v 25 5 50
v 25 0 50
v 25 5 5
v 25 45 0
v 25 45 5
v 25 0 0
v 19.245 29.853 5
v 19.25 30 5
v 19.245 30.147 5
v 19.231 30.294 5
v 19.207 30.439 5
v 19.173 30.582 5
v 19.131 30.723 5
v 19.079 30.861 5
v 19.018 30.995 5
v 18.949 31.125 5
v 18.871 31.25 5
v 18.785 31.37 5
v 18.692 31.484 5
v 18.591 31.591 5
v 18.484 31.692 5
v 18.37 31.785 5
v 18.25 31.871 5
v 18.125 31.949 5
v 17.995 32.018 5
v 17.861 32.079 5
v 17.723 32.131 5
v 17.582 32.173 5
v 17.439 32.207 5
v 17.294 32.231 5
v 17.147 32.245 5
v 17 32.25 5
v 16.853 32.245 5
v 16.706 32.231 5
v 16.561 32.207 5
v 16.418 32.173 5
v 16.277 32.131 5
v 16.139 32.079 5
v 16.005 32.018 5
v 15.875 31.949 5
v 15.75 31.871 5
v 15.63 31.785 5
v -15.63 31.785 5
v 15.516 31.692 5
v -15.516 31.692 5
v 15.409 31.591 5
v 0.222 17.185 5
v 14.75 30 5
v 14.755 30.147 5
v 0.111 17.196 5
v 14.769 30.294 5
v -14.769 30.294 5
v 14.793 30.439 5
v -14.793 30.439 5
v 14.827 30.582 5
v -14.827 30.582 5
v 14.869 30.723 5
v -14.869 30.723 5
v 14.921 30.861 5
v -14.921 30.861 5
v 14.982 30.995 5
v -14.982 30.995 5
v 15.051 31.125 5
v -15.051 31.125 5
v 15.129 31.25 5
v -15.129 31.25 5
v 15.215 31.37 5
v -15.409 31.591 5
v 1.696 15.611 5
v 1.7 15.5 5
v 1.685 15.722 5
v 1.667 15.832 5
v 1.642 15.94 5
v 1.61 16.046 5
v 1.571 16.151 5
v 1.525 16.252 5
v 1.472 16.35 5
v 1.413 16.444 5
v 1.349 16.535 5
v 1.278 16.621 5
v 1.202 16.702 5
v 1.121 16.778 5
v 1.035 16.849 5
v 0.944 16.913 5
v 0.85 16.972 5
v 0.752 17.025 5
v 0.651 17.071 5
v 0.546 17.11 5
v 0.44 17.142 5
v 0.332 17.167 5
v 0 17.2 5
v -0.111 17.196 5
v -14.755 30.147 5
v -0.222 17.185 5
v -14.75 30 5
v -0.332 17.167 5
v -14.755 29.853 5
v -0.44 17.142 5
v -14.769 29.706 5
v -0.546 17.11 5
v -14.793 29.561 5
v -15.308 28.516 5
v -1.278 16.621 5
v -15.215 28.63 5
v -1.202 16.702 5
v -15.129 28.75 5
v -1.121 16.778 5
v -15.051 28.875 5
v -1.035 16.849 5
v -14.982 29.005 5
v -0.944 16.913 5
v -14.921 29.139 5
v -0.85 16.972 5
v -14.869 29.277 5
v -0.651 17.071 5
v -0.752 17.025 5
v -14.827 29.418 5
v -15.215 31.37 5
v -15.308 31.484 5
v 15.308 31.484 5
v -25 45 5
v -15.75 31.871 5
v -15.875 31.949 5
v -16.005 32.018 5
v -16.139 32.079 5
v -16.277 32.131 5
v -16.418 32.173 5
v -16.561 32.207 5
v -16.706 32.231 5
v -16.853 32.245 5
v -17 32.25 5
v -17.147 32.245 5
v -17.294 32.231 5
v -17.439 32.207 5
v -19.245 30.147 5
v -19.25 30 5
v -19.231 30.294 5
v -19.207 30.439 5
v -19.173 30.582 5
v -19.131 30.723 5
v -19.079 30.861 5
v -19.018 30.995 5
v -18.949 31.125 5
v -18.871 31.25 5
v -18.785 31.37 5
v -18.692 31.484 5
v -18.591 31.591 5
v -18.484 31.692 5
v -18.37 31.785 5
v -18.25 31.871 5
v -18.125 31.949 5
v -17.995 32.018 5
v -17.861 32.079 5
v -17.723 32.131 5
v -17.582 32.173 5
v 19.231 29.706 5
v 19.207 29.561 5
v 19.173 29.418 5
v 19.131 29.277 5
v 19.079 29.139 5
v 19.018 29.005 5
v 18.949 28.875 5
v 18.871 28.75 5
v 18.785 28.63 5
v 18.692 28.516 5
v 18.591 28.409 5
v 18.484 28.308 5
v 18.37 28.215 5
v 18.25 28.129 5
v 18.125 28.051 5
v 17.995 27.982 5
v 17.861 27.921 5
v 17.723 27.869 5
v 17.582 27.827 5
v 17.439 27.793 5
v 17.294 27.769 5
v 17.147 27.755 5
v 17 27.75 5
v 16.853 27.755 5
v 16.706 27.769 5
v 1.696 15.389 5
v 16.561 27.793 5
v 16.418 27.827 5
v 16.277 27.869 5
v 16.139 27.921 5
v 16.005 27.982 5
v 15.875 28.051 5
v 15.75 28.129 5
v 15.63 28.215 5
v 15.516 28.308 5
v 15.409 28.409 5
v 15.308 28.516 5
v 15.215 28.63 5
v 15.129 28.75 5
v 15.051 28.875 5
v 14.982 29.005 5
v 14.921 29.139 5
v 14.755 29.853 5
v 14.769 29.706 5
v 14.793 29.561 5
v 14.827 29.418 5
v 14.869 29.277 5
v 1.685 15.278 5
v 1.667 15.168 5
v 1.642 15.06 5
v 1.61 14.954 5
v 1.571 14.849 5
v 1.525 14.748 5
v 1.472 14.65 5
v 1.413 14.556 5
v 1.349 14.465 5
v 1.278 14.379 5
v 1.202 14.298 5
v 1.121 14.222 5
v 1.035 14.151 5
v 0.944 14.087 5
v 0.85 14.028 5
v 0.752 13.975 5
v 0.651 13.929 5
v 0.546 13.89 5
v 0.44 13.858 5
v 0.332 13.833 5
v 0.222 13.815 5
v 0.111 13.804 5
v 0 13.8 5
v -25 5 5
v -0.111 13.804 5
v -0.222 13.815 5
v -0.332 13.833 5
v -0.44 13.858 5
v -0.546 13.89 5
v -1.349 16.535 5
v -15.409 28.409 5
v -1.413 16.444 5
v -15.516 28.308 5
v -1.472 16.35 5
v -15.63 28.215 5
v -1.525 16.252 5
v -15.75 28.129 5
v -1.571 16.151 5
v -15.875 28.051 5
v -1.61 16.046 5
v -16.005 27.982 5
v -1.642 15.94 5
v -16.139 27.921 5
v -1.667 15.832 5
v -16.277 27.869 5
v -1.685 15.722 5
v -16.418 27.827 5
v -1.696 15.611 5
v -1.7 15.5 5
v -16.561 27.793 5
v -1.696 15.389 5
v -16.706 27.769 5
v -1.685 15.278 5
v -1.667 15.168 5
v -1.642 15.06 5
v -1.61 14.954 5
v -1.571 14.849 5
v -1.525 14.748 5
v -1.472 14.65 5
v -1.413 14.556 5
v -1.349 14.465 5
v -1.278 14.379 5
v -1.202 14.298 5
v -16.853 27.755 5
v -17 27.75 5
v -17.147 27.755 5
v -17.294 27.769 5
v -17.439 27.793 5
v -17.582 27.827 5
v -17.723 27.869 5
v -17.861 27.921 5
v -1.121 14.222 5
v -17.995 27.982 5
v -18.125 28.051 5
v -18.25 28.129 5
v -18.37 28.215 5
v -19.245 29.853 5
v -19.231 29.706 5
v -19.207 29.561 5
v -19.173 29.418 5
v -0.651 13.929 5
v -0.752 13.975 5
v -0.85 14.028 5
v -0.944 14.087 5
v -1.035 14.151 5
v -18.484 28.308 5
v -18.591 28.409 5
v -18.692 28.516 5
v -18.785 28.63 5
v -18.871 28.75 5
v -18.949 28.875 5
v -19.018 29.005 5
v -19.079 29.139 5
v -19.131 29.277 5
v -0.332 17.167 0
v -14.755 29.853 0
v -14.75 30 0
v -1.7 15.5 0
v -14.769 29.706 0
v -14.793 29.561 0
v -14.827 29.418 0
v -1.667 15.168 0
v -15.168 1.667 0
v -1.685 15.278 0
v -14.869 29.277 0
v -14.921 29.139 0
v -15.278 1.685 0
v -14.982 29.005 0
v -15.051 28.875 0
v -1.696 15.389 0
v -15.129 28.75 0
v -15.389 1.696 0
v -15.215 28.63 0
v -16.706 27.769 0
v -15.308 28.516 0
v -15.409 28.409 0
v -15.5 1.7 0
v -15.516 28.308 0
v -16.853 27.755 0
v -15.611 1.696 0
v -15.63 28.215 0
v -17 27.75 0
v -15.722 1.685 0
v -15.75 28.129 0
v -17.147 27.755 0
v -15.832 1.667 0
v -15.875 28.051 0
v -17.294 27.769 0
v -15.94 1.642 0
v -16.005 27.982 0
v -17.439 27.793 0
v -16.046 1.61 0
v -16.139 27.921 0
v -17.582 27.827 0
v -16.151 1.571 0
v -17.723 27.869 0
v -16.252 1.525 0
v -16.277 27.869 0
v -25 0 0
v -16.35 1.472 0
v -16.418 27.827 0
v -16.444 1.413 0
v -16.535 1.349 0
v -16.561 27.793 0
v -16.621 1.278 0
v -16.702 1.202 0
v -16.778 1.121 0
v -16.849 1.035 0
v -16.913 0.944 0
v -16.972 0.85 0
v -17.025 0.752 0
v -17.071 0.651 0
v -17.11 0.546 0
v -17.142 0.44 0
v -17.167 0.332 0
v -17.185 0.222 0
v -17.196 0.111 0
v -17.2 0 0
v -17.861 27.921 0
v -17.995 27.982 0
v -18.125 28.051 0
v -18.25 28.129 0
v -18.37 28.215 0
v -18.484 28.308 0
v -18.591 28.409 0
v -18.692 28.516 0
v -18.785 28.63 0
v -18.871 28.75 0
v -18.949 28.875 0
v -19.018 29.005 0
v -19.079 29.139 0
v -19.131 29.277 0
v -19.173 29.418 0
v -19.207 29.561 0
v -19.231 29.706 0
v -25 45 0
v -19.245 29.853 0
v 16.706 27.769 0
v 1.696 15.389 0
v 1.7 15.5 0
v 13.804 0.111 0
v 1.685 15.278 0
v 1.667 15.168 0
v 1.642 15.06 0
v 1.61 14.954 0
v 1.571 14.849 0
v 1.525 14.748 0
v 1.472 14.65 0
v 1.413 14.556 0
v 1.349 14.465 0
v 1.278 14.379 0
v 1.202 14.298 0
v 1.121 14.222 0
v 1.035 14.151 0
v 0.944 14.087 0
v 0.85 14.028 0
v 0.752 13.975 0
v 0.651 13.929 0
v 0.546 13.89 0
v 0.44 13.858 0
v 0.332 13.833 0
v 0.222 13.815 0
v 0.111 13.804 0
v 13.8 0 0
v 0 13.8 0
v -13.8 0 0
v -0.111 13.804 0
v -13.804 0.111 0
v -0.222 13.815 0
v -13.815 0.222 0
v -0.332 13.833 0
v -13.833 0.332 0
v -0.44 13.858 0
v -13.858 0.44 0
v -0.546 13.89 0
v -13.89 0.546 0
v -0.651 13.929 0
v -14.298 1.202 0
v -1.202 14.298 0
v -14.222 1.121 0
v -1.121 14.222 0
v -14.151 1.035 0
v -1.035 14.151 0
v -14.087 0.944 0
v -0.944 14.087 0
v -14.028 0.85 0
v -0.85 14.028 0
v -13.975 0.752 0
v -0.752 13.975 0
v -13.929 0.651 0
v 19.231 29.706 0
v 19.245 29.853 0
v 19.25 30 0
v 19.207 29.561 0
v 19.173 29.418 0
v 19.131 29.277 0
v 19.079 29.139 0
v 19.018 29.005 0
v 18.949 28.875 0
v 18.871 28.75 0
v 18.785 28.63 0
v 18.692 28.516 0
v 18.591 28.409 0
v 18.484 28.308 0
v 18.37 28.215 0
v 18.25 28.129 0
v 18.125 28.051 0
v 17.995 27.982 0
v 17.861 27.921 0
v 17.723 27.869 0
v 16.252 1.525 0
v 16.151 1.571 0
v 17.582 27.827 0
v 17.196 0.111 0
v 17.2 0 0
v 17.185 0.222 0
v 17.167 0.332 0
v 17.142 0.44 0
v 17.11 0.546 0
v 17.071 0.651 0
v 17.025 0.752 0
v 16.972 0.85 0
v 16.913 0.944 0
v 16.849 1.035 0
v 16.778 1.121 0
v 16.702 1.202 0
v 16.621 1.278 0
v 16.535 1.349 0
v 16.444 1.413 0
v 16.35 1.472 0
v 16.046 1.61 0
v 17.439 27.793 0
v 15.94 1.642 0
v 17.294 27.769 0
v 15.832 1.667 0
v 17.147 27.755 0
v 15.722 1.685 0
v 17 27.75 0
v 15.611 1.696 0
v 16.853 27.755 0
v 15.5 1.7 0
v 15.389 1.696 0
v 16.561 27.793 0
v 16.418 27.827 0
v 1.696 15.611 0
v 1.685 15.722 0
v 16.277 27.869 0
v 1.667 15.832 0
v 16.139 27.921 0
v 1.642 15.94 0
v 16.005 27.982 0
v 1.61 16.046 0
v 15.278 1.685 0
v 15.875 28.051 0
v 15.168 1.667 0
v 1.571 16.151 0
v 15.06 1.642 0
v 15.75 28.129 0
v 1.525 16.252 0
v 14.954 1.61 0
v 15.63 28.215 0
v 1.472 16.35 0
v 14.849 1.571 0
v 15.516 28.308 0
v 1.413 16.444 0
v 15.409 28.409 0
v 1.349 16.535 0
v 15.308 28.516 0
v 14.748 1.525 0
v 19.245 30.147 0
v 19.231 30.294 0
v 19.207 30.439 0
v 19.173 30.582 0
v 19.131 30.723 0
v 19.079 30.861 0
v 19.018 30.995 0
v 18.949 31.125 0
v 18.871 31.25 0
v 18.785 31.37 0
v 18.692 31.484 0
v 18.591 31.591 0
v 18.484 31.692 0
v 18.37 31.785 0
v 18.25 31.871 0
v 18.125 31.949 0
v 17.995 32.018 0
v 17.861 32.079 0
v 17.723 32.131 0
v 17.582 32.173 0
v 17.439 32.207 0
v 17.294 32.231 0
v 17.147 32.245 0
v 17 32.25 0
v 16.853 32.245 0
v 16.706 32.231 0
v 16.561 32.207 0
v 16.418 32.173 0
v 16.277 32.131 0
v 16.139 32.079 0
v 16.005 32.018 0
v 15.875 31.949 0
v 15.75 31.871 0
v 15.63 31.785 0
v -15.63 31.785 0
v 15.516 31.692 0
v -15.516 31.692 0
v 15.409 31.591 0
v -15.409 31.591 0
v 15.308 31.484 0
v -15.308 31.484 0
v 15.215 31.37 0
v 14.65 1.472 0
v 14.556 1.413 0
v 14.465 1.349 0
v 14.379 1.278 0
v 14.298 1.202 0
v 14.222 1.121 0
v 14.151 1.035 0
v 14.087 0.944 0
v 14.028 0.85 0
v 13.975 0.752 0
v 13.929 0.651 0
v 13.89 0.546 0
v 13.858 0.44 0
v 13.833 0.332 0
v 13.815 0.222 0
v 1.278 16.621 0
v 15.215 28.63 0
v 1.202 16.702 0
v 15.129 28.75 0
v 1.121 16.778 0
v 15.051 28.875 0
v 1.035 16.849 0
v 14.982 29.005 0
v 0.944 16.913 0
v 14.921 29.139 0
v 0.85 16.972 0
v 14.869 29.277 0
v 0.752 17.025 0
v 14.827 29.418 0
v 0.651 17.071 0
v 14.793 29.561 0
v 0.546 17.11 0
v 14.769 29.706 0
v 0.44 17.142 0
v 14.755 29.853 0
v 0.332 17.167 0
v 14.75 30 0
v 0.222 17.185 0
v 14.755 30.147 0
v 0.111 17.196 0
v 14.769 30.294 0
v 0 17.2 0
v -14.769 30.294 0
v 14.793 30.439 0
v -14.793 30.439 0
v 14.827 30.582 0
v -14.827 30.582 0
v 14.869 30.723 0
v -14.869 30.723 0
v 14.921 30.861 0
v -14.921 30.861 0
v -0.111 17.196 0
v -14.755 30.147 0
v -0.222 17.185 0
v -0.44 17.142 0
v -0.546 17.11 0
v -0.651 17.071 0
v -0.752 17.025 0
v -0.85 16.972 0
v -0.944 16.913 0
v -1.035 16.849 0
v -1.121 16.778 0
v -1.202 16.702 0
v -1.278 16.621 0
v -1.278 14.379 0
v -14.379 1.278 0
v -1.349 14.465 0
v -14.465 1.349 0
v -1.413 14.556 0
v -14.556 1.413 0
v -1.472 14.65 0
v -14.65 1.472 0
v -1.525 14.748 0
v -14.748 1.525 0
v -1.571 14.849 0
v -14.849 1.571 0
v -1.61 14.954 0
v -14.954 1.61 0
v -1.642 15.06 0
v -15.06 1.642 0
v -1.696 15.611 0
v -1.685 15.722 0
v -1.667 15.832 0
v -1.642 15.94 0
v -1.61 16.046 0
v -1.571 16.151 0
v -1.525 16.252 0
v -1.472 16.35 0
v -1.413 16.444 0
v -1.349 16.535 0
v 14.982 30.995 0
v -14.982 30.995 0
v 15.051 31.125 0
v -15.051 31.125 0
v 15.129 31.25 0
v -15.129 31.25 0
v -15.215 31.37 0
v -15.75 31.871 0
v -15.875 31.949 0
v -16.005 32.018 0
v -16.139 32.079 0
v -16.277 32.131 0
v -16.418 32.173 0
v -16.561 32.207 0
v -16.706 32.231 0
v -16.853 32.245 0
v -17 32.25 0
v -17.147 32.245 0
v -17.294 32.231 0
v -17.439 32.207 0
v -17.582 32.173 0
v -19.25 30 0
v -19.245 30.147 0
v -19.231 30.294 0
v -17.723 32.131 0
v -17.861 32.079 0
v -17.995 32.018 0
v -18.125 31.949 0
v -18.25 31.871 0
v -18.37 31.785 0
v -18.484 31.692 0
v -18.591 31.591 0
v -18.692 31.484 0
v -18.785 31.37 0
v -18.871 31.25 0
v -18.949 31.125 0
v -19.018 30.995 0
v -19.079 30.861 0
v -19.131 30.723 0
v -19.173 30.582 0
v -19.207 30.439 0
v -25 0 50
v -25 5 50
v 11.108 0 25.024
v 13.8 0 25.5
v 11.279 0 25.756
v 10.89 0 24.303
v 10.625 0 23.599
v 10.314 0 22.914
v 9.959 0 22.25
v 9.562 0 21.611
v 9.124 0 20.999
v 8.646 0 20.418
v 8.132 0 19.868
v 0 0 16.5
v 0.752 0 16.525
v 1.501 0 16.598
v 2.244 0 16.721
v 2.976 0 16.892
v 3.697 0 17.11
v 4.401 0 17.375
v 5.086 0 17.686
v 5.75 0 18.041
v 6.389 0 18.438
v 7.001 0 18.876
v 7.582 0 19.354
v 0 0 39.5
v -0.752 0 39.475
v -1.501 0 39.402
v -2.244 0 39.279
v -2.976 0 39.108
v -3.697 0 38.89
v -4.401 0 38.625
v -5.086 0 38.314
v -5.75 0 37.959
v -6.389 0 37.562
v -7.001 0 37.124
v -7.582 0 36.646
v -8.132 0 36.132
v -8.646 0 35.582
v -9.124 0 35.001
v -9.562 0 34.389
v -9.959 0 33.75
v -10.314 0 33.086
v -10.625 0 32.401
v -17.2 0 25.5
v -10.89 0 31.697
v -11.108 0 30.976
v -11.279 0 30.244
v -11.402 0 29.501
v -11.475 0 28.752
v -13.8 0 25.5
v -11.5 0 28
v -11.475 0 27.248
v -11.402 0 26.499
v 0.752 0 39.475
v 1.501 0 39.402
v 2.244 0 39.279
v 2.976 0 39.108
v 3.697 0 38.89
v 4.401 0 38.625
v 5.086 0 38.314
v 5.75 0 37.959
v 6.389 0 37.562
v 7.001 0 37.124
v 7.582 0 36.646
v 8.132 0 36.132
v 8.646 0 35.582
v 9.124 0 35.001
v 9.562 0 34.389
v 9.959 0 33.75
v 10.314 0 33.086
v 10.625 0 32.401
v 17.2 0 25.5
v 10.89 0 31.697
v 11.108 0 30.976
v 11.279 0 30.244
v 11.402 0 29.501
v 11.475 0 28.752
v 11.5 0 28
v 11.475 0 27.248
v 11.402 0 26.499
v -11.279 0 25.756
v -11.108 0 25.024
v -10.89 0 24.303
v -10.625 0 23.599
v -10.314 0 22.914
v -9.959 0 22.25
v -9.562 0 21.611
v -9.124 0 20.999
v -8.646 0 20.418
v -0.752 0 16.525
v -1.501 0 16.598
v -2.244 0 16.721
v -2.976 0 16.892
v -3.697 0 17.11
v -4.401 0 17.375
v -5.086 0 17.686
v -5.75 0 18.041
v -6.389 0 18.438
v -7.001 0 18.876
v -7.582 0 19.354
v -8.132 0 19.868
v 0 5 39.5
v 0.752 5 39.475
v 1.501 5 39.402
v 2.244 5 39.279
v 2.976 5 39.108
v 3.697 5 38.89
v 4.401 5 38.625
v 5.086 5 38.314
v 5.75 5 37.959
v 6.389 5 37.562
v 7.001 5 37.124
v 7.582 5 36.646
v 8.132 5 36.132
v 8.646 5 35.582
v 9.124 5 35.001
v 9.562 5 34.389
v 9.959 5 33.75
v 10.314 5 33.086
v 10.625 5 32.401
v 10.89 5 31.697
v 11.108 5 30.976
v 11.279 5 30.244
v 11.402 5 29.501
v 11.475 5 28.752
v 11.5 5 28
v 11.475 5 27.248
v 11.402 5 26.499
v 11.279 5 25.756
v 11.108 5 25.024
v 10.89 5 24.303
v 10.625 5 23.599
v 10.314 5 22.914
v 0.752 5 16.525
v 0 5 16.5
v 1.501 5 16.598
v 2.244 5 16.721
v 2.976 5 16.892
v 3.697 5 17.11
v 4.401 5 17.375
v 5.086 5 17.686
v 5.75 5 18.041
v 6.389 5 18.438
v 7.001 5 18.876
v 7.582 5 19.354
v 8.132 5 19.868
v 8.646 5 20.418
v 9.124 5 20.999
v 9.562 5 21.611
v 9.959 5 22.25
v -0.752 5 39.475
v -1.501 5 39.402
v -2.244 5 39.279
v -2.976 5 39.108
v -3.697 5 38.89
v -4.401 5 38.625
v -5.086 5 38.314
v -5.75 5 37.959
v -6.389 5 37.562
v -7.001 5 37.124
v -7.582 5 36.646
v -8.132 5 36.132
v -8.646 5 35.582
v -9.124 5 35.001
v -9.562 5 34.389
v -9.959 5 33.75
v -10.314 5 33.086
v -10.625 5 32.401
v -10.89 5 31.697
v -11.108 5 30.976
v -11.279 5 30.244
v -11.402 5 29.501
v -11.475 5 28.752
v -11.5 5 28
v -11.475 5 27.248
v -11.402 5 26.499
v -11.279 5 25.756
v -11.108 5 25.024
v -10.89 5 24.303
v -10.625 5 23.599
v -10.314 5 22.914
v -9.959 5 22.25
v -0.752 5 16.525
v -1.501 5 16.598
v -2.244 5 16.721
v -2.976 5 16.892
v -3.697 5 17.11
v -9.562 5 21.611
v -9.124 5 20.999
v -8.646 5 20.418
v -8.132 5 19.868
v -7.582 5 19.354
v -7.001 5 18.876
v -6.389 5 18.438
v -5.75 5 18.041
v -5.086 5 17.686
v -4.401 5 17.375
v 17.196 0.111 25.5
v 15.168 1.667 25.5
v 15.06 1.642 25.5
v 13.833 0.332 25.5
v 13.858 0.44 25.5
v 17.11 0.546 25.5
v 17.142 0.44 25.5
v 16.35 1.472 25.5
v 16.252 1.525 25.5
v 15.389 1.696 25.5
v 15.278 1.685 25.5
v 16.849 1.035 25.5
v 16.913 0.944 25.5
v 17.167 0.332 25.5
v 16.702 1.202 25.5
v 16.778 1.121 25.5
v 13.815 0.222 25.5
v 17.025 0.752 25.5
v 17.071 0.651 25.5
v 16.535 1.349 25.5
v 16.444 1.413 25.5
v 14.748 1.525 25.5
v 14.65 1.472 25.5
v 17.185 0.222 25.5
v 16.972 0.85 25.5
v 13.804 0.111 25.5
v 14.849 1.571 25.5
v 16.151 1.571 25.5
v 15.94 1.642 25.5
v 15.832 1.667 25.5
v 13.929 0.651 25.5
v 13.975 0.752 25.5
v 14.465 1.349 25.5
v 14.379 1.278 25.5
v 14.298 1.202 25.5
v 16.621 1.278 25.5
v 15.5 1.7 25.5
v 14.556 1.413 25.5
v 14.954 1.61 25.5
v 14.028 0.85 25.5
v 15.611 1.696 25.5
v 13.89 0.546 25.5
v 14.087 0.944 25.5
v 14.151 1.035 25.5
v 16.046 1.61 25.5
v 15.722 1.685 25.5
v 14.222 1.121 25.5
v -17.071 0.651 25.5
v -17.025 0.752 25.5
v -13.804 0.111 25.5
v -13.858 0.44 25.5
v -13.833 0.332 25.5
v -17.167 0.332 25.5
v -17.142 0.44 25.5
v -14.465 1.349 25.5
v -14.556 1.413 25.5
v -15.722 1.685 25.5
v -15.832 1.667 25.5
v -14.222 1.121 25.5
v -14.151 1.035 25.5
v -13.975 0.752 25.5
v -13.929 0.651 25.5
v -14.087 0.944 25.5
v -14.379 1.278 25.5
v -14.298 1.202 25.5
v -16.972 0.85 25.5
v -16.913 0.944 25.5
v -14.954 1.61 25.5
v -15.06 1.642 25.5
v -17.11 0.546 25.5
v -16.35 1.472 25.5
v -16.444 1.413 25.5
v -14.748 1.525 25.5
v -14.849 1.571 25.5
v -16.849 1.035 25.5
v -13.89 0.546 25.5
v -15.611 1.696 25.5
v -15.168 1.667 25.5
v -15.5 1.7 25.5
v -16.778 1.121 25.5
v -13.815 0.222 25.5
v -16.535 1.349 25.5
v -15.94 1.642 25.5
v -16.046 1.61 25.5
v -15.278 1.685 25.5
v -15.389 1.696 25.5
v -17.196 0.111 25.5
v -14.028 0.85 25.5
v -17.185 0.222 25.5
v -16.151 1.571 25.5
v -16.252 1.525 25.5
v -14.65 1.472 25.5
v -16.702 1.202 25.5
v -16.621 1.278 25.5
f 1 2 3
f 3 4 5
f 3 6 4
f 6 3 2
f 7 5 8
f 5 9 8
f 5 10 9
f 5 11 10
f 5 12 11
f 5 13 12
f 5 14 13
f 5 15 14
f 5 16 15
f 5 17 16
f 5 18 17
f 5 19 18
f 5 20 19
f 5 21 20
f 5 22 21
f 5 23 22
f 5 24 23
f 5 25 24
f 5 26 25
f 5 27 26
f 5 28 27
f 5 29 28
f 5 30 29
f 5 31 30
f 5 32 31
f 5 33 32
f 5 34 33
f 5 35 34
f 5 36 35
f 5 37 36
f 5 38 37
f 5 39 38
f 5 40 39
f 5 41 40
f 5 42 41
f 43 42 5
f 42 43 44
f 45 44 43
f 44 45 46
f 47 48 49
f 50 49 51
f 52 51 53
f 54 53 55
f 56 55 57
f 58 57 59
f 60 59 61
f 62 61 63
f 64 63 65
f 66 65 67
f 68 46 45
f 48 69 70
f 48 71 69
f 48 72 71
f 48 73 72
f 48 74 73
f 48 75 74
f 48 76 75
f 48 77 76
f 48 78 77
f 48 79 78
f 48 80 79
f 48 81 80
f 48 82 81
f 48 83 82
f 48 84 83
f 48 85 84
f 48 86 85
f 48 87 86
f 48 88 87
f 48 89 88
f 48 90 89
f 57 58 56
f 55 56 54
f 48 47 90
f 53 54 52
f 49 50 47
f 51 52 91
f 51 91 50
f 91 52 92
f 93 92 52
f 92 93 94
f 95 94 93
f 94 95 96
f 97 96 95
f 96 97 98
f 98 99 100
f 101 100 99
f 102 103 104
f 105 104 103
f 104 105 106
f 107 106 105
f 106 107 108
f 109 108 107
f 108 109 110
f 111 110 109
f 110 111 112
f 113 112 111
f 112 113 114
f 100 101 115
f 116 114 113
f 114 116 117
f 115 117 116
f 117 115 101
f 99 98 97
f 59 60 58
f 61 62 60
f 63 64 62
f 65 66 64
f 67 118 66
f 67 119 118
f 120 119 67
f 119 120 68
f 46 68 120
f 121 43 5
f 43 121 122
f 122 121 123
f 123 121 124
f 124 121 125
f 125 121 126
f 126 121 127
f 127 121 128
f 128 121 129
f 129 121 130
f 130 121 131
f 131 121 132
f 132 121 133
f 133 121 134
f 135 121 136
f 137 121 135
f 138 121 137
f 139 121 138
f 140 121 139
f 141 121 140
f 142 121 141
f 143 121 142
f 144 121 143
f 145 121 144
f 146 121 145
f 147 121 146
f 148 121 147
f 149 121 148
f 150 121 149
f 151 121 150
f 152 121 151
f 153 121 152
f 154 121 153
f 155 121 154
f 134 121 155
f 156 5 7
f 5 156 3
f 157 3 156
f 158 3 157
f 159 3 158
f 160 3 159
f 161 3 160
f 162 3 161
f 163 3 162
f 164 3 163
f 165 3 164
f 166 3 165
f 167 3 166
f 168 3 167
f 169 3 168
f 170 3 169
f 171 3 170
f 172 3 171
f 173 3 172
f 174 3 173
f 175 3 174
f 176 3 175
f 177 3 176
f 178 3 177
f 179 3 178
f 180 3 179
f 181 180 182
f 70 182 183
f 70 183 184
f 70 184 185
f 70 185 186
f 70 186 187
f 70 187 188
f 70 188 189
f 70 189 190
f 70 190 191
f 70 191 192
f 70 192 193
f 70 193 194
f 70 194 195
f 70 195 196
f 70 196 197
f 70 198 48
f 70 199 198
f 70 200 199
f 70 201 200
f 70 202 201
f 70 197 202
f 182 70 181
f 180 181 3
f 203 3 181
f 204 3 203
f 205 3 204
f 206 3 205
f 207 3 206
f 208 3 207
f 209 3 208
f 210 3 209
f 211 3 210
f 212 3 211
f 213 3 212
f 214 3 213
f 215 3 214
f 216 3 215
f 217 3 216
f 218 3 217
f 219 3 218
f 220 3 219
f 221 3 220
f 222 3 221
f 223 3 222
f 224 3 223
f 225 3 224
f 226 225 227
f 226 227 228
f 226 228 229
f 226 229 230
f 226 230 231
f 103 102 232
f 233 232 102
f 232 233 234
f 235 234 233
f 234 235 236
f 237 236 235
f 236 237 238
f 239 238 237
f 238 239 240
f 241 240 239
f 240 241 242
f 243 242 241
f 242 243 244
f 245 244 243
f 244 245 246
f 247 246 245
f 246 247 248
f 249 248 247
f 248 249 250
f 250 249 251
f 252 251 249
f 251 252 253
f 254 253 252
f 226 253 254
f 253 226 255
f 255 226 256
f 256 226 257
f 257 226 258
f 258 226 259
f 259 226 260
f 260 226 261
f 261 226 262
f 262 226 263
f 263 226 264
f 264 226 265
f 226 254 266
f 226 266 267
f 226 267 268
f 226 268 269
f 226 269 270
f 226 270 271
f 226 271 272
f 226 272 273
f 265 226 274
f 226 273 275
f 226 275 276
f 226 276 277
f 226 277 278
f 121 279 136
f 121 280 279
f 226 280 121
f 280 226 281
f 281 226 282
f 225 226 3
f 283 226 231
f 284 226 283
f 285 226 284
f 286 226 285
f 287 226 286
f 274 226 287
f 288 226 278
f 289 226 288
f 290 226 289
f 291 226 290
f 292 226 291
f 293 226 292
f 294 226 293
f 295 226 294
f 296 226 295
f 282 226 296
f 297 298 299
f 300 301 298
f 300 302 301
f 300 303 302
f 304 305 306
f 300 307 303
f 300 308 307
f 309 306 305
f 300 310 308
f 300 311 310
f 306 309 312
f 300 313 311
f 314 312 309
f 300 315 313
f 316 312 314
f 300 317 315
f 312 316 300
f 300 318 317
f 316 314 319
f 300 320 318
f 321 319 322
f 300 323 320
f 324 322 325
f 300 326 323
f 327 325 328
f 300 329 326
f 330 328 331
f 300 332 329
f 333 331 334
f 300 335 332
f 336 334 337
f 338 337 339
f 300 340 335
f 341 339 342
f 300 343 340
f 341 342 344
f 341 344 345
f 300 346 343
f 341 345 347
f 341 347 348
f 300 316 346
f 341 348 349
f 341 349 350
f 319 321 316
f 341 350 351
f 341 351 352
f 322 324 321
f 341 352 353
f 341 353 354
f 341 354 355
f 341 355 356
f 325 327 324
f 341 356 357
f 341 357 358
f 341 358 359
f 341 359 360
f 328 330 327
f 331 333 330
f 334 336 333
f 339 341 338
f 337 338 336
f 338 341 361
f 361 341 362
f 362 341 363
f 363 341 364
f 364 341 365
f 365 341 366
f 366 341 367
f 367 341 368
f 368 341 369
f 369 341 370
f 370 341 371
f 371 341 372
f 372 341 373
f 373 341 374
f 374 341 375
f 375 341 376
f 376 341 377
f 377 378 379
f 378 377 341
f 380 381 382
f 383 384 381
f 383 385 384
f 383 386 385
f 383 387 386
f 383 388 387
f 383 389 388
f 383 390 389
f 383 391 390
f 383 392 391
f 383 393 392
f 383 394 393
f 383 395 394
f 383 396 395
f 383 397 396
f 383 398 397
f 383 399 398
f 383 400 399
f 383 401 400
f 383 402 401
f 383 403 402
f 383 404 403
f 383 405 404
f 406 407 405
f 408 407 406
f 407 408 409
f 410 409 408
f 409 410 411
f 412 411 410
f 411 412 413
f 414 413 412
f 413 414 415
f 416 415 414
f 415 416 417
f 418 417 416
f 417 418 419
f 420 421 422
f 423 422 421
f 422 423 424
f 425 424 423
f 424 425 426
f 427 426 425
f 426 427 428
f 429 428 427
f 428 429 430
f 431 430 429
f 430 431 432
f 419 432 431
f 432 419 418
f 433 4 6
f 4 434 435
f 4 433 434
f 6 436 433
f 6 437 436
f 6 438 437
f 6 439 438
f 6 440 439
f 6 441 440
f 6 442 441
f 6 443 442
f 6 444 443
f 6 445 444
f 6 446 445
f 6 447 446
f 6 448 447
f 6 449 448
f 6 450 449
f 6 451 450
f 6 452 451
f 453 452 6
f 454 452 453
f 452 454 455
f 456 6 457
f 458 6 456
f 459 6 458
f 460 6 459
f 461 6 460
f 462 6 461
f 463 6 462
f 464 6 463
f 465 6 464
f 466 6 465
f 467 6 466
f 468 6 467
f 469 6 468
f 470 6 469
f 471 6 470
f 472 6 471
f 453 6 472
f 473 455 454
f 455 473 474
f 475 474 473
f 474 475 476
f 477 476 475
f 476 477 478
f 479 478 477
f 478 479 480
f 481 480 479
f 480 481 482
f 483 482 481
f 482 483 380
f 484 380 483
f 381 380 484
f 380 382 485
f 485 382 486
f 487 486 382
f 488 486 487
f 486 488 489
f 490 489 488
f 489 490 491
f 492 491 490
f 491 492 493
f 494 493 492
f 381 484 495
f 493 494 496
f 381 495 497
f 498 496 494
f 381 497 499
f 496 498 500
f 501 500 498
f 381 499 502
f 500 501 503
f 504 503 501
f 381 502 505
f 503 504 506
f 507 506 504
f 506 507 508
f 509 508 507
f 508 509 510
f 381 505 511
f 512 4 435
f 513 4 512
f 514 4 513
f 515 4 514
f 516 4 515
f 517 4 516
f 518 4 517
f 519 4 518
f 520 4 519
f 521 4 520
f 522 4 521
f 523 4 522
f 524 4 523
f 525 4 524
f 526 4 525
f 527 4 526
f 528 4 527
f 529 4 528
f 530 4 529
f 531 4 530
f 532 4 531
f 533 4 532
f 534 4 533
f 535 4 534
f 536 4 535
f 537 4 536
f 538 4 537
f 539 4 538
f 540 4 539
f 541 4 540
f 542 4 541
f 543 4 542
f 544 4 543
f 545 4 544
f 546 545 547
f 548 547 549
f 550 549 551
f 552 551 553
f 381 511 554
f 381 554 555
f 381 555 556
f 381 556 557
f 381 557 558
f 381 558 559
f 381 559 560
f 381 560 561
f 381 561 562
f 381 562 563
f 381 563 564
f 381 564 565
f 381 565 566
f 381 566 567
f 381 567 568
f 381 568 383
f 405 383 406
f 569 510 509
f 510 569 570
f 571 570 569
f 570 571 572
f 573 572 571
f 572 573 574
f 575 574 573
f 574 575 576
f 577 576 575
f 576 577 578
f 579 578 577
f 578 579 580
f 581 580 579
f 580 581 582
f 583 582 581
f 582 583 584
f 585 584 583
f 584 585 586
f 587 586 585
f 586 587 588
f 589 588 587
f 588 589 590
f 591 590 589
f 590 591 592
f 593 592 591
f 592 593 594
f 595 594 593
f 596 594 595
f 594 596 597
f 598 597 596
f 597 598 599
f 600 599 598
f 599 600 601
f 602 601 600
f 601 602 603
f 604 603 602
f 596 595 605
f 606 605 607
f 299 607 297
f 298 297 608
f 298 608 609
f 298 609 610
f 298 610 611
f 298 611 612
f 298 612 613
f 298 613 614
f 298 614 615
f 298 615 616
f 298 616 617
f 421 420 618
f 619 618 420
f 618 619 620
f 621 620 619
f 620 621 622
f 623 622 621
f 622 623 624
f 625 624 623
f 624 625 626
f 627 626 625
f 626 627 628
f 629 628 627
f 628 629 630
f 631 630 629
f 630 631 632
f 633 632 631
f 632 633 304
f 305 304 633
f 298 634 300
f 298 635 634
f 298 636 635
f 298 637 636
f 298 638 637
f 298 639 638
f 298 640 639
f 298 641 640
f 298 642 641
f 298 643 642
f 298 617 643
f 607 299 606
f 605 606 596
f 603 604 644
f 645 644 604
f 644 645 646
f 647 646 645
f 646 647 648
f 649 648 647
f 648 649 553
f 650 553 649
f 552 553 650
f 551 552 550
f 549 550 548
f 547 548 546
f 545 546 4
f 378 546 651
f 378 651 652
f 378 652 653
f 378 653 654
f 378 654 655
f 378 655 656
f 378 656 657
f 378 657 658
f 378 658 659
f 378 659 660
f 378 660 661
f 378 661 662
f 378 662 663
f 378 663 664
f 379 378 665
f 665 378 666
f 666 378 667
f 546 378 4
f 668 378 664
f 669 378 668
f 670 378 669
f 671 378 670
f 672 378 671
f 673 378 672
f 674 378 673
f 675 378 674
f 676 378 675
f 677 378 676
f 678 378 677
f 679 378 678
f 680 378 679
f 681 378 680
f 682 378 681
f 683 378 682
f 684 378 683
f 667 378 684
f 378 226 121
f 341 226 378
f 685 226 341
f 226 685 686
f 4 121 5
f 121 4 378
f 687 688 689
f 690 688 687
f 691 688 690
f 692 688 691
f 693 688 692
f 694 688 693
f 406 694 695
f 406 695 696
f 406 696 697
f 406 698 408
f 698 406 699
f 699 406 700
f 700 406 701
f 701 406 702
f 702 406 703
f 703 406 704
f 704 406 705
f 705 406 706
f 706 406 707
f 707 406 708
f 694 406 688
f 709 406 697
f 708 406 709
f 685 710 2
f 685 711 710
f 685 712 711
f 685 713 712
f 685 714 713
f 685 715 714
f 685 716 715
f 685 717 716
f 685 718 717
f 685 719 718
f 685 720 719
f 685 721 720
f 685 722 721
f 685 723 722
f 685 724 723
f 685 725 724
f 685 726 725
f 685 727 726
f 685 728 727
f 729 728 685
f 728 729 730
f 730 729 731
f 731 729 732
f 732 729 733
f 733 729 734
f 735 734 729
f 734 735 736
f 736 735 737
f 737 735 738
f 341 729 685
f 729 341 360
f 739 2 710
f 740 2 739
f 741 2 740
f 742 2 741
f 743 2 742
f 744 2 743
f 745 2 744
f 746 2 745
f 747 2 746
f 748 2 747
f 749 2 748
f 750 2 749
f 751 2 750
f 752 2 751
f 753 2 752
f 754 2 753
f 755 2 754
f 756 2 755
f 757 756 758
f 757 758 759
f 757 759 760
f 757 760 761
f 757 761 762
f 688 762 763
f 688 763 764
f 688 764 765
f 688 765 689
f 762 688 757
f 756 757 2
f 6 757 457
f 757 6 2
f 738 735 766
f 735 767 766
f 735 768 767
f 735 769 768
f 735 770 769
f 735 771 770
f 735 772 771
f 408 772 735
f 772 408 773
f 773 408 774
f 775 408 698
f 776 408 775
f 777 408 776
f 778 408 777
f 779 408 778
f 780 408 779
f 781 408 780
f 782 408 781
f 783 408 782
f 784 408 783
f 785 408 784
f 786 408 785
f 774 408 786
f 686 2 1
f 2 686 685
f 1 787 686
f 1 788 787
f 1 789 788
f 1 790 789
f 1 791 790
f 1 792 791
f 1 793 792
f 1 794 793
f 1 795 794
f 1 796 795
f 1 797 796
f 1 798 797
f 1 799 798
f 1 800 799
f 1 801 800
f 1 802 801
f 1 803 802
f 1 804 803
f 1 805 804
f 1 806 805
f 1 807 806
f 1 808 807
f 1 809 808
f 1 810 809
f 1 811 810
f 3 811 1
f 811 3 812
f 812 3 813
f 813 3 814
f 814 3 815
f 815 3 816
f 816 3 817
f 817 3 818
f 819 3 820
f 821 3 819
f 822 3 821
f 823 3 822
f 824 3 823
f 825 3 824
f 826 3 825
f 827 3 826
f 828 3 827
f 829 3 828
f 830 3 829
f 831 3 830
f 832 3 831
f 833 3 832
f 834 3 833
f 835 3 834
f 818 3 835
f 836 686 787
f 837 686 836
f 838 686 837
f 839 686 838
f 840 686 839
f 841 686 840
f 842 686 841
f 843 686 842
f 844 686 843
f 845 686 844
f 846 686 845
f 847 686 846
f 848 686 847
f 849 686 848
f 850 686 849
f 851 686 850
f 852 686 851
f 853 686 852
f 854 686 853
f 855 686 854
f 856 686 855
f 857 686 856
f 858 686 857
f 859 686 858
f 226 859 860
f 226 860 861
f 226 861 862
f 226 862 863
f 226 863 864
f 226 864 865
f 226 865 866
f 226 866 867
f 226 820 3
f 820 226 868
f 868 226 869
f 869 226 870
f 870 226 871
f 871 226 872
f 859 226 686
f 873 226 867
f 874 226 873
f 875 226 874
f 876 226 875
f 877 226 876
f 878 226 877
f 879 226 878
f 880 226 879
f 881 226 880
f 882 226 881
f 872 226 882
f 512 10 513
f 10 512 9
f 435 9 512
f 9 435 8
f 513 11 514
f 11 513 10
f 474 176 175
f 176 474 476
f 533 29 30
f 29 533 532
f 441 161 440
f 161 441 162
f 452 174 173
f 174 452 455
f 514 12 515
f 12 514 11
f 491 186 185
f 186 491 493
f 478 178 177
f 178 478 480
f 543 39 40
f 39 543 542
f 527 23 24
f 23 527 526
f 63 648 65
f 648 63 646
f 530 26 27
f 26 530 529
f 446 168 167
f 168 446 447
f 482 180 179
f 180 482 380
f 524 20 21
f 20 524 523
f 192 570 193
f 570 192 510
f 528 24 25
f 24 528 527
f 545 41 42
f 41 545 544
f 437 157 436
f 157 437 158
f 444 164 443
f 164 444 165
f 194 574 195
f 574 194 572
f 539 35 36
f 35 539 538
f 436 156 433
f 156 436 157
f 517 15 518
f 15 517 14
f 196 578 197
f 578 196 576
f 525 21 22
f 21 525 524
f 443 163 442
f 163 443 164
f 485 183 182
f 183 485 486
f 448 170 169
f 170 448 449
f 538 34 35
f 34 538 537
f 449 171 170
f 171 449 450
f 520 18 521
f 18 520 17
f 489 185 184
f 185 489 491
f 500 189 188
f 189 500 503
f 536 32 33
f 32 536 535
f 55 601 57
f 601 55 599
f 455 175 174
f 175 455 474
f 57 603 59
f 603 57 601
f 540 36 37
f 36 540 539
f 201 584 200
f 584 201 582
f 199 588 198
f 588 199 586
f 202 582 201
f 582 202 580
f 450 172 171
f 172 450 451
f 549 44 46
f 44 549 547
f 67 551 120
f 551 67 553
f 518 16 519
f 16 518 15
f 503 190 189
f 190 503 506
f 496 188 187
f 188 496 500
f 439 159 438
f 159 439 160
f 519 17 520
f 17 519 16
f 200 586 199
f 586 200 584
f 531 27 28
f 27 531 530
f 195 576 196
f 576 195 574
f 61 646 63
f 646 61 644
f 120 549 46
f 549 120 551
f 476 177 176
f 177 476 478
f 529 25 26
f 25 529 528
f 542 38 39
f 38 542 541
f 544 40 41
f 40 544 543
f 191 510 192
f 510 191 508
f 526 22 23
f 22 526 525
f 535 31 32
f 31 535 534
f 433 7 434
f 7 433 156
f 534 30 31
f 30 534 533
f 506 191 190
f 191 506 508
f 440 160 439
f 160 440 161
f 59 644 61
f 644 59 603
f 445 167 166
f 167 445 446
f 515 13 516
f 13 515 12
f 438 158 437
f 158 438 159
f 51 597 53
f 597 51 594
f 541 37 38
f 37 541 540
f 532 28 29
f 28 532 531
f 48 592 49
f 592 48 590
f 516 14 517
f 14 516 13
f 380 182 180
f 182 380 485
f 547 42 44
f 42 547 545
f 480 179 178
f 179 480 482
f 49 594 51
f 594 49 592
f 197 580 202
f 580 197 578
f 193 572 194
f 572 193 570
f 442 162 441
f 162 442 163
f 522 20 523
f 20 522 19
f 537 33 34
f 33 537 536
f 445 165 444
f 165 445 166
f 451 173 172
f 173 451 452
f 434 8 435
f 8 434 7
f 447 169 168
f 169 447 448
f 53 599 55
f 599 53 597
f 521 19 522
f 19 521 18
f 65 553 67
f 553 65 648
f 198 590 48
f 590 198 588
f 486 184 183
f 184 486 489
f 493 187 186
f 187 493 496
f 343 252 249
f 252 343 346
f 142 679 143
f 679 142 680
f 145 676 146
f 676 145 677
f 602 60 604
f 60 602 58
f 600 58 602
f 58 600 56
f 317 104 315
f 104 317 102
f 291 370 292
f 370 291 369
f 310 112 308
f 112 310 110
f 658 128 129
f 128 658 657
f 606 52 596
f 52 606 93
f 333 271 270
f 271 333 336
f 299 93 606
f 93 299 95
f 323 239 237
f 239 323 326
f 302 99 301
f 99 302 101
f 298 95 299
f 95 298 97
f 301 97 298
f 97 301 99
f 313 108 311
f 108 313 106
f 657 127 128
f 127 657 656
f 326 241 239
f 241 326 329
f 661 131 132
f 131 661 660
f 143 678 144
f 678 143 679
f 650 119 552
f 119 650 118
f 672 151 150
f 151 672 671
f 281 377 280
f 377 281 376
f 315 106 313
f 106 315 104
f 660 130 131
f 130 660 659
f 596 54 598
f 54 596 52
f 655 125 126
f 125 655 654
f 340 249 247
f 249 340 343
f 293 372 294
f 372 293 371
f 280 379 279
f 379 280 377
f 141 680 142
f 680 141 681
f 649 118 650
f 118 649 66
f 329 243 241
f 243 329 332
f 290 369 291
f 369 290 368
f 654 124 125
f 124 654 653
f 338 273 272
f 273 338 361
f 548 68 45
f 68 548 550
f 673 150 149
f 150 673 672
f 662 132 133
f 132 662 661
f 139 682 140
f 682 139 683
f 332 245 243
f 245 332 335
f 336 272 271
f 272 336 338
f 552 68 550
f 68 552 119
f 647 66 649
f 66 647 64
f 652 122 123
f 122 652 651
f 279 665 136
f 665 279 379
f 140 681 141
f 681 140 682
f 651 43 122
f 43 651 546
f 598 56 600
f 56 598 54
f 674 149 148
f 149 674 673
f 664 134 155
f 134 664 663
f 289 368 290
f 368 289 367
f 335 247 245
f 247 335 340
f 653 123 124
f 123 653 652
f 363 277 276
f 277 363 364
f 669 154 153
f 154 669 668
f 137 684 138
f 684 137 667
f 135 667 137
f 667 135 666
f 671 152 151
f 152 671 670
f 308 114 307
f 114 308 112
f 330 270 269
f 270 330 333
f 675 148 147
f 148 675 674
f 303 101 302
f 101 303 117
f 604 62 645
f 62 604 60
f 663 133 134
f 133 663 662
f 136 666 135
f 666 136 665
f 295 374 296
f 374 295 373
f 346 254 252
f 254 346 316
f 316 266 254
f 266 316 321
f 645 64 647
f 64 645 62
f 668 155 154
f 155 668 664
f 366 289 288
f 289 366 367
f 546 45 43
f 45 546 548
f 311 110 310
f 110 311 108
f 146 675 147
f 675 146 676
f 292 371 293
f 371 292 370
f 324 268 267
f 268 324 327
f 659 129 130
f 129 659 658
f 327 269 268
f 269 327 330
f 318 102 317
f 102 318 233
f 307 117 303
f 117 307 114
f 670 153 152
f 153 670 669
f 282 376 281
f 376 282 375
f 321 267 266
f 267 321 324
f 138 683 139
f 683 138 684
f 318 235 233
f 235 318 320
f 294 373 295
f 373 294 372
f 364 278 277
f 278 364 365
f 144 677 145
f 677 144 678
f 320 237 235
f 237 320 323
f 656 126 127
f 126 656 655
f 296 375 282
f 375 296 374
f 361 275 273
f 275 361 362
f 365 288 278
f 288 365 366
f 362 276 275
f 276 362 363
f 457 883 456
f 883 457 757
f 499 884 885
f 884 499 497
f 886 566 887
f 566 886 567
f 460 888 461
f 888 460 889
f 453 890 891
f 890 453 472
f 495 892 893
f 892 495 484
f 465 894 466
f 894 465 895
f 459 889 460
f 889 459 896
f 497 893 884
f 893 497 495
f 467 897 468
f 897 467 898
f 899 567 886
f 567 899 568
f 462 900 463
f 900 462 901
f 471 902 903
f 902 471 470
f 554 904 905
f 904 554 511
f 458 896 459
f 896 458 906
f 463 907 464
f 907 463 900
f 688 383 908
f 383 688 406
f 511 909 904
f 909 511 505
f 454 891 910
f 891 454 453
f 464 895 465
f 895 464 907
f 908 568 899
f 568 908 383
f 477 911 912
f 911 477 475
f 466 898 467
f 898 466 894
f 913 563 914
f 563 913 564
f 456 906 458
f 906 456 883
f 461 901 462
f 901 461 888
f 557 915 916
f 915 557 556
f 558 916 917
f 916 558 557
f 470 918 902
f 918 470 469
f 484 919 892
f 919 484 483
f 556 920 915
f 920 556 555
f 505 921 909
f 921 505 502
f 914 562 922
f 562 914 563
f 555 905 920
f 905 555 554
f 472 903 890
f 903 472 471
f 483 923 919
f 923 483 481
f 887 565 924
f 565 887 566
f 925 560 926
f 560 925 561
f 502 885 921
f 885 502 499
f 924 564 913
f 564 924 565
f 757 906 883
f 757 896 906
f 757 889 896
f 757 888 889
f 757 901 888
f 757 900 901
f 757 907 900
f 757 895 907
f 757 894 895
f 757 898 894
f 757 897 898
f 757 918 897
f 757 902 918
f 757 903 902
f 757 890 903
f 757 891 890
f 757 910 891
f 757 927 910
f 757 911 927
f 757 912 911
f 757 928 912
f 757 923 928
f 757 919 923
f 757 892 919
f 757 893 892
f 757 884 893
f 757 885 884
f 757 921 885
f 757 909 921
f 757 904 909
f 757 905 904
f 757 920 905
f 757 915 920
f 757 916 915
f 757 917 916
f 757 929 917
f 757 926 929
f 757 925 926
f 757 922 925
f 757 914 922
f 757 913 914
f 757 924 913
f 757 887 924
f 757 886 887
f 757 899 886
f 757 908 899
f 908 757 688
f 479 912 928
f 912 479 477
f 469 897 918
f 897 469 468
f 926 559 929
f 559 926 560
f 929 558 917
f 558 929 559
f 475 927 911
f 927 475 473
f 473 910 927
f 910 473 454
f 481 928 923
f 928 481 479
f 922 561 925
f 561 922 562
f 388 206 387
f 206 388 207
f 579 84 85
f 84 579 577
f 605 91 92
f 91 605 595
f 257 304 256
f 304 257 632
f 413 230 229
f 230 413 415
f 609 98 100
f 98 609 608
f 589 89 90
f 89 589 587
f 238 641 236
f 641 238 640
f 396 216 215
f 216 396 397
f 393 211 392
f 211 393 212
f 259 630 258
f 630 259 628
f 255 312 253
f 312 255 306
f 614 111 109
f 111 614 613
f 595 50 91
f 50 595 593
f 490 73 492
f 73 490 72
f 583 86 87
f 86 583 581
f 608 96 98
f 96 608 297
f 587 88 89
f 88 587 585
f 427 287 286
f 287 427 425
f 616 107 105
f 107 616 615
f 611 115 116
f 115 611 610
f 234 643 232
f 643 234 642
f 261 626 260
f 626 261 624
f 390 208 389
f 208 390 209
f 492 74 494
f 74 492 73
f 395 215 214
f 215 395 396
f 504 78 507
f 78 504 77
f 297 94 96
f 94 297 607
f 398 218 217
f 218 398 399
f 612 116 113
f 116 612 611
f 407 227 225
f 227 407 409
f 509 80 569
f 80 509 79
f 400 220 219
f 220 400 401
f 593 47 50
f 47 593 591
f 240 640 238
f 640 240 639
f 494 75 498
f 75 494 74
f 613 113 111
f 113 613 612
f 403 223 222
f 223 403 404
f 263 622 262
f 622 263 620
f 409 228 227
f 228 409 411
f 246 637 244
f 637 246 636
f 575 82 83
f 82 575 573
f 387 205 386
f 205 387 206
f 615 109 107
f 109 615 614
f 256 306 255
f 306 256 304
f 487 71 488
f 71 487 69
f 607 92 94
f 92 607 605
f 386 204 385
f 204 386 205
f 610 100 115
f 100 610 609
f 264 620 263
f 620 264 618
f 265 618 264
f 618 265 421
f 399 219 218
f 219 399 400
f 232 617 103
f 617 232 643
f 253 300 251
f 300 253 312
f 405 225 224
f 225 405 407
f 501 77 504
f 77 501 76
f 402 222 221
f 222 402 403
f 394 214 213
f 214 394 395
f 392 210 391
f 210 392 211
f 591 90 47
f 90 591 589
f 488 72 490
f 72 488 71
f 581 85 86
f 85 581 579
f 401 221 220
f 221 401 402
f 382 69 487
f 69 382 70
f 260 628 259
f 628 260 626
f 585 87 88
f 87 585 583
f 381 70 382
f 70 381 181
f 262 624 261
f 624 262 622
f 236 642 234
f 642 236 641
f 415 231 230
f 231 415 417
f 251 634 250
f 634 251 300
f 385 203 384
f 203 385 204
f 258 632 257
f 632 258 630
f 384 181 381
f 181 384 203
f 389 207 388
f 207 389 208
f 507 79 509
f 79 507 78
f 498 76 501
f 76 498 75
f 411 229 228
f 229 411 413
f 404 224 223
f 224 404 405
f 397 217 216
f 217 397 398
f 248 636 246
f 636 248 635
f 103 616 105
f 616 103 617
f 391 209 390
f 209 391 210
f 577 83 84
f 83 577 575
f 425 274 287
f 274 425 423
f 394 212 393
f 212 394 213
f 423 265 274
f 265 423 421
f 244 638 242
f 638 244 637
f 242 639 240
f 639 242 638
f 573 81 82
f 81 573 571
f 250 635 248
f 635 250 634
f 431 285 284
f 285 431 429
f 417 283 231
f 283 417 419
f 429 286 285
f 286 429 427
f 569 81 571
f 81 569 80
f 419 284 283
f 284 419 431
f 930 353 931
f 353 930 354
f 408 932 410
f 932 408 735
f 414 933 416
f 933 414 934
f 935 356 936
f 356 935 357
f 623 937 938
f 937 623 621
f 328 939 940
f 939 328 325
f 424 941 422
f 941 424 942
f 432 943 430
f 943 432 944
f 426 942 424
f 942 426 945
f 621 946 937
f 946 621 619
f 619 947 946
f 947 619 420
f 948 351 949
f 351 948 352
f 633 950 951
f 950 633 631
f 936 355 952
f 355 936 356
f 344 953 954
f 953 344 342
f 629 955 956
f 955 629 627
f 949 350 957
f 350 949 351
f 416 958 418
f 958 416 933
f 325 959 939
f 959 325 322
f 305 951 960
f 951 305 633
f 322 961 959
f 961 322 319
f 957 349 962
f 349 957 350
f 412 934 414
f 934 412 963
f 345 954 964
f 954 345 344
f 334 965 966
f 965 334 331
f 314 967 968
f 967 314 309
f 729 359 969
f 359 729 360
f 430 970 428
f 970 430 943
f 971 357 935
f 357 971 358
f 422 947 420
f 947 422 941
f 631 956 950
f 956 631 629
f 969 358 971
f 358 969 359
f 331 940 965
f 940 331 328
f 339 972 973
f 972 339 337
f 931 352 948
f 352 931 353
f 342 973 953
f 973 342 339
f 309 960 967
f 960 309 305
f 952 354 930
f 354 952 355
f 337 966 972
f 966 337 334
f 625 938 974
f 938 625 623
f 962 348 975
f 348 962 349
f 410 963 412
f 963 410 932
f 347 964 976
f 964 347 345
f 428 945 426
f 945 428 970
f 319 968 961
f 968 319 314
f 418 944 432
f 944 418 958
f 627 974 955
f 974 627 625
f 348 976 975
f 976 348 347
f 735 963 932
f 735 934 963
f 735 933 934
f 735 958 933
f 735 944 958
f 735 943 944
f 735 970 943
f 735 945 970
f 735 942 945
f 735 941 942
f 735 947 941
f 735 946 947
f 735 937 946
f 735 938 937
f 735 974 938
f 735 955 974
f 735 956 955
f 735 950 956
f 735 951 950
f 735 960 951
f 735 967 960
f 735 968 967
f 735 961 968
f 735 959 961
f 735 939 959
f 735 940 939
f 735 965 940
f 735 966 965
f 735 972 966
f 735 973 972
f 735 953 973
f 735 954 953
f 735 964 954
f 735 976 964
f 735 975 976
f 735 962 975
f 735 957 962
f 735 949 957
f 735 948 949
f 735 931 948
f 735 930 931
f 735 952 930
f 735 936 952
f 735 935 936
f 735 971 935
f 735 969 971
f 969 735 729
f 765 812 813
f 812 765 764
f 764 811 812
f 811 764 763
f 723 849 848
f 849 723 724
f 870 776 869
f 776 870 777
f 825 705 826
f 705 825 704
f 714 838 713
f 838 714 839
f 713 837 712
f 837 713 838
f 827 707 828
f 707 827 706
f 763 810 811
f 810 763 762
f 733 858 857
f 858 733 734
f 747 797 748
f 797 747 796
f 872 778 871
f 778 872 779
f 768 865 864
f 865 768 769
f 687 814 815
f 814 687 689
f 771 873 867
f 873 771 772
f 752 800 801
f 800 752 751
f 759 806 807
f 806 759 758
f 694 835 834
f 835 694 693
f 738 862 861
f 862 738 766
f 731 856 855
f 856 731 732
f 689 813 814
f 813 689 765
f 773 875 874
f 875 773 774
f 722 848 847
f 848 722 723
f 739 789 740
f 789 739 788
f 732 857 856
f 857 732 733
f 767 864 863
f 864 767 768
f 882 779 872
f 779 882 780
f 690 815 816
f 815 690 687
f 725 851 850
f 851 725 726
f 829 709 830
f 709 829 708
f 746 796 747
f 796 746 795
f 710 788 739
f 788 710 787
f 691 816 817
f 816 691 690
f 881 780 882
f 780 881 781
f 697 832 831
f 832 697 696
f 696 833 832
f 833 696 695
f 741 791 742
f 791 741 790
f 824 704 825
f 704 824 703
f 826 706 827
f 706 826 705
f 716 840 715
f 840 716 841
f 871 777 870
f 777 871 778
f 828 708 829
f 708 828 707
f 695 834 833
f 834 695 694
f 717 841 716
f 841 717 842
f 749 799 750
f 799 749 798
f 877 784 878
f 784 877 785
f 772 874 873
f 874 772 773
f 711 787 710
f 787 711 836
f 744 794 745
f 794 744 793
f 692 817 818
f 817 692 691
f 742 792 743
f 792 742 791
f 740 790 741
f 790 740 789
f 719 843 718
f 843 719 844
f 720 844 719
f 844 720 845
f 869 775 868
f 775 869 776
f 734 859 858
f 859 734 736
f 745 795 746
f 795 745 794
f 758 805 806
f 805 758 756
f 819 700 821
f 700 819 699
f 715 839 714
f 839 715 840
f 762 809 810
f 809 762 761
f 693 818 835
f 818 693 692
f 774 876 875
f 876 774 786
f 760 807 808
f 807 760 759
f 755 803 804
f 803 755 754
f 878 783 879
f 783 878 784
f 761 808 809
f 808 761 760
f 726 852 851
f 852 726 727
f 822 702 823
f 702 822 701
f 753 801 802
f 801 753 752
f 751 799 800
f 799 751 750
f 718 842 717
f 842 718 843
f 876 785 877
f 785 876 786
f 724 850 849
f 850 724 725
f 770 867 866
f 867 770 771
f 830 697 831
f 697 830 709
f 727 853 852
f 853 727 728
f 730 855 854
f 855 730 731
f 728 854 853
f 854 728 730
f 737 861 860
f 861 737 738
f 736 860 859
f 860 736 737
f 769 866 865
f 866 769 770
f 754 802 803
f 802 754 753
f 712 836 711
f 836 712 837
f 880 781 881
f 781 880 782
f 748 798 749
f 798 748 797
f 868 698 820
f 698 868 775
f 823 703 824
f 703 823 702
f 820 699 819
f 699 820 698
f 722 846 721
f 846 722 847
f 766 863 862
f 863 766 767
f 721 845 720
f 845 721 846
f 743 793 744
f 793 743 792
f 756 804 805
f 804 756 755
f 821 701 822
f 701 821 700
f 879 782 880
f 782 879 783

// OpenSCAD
// L-shaped mounting bracket for a NEMA 17 stepper motor
// Print orientation: base plate on the bed (z = 0), vertical plate builds upward.

// ---------------- Parameters ----------------
plate_x       = 25;    // base plate half-length in X (mm)
plate_y       = 45;    // base plate length in Y (mm)
plate_t       = 5;     // base plate thickness (mm)

motor_h       = 50;    // vertical motor plate height (mm)
motor_w       = 25;    // vertical motor plate half-width in X (mm)

boss_d        = 23;    // diameter of the motor centring-boss hole (mm)
boss_x        = 0;     // boss hole centre X (mm)
boss_z        = 28;    // boss hole centre Z (mm)

screw_d       = 3.4;   // M3 screw hole diameter (mm)
screw_pitch   = 31;    // square pattern pitch for the four screw holes (mm)

gusset_t      = 5;     // gusset thickness along X (mm)
gusset_y      = 20;    // gusset leg length along +Y (mm)
gusset_z      = 20;    // gusset leg length along +Z (mm)

eps           = 0.5;   // cutter overshoot past faces (mm)
$fn           = 96;    // curve resolution

// ---------------- Model ----------------
difference() {
    union() {
        // Base plate
        translate([-plate_x, 0, 0])
            cube([plate_x * 2, plate_y, plate_t]);

        // Vertical motor plate, standing on the back edge of the base
        translate([-motor_w, 0, 0])
            cube([motor_w * 2, plate_t, motor_h]);
    }

    // Base-plate through-holes (M4)
    for (h = [-1, 1])
        translate([-17 * h, 30, -eps])
            cylinder(d = 4.5, h = plate_t + 2 * eps);

    // Motor-boss hole along Y, centred at x = 0, z = 28
    translate([boss_x, -eps, boss_z])
        rotate([-90, 0, 0])
            cylinder(d = boss_d, h = plate_t + 2 * eps);

    // Four M3 screw holes on a 31 mm square pattern, centred on the boss hole
    for (a = [0, 90, 180, 270])
        rotate([0, 0, a])
            translate([screw_pitch / 2, 0, 0])
                cylinder(d = screw_d, h = motor_h + 2 * eps, center = true);

    // Triangular gussets, flush with the left and right edges
    for (sx = [-1, 1])
        translate([sx * (plate_x - gusset_t), 0, 0])
            rotate([90, 0, 0])
                linear_extrude(height = gusset_t)
                    polygon(points = [
                        [gusset_y, gusset_z],
                        [plate_t, gusset_z],
                        [plate_t, gusset_y]
                    ]);
}
